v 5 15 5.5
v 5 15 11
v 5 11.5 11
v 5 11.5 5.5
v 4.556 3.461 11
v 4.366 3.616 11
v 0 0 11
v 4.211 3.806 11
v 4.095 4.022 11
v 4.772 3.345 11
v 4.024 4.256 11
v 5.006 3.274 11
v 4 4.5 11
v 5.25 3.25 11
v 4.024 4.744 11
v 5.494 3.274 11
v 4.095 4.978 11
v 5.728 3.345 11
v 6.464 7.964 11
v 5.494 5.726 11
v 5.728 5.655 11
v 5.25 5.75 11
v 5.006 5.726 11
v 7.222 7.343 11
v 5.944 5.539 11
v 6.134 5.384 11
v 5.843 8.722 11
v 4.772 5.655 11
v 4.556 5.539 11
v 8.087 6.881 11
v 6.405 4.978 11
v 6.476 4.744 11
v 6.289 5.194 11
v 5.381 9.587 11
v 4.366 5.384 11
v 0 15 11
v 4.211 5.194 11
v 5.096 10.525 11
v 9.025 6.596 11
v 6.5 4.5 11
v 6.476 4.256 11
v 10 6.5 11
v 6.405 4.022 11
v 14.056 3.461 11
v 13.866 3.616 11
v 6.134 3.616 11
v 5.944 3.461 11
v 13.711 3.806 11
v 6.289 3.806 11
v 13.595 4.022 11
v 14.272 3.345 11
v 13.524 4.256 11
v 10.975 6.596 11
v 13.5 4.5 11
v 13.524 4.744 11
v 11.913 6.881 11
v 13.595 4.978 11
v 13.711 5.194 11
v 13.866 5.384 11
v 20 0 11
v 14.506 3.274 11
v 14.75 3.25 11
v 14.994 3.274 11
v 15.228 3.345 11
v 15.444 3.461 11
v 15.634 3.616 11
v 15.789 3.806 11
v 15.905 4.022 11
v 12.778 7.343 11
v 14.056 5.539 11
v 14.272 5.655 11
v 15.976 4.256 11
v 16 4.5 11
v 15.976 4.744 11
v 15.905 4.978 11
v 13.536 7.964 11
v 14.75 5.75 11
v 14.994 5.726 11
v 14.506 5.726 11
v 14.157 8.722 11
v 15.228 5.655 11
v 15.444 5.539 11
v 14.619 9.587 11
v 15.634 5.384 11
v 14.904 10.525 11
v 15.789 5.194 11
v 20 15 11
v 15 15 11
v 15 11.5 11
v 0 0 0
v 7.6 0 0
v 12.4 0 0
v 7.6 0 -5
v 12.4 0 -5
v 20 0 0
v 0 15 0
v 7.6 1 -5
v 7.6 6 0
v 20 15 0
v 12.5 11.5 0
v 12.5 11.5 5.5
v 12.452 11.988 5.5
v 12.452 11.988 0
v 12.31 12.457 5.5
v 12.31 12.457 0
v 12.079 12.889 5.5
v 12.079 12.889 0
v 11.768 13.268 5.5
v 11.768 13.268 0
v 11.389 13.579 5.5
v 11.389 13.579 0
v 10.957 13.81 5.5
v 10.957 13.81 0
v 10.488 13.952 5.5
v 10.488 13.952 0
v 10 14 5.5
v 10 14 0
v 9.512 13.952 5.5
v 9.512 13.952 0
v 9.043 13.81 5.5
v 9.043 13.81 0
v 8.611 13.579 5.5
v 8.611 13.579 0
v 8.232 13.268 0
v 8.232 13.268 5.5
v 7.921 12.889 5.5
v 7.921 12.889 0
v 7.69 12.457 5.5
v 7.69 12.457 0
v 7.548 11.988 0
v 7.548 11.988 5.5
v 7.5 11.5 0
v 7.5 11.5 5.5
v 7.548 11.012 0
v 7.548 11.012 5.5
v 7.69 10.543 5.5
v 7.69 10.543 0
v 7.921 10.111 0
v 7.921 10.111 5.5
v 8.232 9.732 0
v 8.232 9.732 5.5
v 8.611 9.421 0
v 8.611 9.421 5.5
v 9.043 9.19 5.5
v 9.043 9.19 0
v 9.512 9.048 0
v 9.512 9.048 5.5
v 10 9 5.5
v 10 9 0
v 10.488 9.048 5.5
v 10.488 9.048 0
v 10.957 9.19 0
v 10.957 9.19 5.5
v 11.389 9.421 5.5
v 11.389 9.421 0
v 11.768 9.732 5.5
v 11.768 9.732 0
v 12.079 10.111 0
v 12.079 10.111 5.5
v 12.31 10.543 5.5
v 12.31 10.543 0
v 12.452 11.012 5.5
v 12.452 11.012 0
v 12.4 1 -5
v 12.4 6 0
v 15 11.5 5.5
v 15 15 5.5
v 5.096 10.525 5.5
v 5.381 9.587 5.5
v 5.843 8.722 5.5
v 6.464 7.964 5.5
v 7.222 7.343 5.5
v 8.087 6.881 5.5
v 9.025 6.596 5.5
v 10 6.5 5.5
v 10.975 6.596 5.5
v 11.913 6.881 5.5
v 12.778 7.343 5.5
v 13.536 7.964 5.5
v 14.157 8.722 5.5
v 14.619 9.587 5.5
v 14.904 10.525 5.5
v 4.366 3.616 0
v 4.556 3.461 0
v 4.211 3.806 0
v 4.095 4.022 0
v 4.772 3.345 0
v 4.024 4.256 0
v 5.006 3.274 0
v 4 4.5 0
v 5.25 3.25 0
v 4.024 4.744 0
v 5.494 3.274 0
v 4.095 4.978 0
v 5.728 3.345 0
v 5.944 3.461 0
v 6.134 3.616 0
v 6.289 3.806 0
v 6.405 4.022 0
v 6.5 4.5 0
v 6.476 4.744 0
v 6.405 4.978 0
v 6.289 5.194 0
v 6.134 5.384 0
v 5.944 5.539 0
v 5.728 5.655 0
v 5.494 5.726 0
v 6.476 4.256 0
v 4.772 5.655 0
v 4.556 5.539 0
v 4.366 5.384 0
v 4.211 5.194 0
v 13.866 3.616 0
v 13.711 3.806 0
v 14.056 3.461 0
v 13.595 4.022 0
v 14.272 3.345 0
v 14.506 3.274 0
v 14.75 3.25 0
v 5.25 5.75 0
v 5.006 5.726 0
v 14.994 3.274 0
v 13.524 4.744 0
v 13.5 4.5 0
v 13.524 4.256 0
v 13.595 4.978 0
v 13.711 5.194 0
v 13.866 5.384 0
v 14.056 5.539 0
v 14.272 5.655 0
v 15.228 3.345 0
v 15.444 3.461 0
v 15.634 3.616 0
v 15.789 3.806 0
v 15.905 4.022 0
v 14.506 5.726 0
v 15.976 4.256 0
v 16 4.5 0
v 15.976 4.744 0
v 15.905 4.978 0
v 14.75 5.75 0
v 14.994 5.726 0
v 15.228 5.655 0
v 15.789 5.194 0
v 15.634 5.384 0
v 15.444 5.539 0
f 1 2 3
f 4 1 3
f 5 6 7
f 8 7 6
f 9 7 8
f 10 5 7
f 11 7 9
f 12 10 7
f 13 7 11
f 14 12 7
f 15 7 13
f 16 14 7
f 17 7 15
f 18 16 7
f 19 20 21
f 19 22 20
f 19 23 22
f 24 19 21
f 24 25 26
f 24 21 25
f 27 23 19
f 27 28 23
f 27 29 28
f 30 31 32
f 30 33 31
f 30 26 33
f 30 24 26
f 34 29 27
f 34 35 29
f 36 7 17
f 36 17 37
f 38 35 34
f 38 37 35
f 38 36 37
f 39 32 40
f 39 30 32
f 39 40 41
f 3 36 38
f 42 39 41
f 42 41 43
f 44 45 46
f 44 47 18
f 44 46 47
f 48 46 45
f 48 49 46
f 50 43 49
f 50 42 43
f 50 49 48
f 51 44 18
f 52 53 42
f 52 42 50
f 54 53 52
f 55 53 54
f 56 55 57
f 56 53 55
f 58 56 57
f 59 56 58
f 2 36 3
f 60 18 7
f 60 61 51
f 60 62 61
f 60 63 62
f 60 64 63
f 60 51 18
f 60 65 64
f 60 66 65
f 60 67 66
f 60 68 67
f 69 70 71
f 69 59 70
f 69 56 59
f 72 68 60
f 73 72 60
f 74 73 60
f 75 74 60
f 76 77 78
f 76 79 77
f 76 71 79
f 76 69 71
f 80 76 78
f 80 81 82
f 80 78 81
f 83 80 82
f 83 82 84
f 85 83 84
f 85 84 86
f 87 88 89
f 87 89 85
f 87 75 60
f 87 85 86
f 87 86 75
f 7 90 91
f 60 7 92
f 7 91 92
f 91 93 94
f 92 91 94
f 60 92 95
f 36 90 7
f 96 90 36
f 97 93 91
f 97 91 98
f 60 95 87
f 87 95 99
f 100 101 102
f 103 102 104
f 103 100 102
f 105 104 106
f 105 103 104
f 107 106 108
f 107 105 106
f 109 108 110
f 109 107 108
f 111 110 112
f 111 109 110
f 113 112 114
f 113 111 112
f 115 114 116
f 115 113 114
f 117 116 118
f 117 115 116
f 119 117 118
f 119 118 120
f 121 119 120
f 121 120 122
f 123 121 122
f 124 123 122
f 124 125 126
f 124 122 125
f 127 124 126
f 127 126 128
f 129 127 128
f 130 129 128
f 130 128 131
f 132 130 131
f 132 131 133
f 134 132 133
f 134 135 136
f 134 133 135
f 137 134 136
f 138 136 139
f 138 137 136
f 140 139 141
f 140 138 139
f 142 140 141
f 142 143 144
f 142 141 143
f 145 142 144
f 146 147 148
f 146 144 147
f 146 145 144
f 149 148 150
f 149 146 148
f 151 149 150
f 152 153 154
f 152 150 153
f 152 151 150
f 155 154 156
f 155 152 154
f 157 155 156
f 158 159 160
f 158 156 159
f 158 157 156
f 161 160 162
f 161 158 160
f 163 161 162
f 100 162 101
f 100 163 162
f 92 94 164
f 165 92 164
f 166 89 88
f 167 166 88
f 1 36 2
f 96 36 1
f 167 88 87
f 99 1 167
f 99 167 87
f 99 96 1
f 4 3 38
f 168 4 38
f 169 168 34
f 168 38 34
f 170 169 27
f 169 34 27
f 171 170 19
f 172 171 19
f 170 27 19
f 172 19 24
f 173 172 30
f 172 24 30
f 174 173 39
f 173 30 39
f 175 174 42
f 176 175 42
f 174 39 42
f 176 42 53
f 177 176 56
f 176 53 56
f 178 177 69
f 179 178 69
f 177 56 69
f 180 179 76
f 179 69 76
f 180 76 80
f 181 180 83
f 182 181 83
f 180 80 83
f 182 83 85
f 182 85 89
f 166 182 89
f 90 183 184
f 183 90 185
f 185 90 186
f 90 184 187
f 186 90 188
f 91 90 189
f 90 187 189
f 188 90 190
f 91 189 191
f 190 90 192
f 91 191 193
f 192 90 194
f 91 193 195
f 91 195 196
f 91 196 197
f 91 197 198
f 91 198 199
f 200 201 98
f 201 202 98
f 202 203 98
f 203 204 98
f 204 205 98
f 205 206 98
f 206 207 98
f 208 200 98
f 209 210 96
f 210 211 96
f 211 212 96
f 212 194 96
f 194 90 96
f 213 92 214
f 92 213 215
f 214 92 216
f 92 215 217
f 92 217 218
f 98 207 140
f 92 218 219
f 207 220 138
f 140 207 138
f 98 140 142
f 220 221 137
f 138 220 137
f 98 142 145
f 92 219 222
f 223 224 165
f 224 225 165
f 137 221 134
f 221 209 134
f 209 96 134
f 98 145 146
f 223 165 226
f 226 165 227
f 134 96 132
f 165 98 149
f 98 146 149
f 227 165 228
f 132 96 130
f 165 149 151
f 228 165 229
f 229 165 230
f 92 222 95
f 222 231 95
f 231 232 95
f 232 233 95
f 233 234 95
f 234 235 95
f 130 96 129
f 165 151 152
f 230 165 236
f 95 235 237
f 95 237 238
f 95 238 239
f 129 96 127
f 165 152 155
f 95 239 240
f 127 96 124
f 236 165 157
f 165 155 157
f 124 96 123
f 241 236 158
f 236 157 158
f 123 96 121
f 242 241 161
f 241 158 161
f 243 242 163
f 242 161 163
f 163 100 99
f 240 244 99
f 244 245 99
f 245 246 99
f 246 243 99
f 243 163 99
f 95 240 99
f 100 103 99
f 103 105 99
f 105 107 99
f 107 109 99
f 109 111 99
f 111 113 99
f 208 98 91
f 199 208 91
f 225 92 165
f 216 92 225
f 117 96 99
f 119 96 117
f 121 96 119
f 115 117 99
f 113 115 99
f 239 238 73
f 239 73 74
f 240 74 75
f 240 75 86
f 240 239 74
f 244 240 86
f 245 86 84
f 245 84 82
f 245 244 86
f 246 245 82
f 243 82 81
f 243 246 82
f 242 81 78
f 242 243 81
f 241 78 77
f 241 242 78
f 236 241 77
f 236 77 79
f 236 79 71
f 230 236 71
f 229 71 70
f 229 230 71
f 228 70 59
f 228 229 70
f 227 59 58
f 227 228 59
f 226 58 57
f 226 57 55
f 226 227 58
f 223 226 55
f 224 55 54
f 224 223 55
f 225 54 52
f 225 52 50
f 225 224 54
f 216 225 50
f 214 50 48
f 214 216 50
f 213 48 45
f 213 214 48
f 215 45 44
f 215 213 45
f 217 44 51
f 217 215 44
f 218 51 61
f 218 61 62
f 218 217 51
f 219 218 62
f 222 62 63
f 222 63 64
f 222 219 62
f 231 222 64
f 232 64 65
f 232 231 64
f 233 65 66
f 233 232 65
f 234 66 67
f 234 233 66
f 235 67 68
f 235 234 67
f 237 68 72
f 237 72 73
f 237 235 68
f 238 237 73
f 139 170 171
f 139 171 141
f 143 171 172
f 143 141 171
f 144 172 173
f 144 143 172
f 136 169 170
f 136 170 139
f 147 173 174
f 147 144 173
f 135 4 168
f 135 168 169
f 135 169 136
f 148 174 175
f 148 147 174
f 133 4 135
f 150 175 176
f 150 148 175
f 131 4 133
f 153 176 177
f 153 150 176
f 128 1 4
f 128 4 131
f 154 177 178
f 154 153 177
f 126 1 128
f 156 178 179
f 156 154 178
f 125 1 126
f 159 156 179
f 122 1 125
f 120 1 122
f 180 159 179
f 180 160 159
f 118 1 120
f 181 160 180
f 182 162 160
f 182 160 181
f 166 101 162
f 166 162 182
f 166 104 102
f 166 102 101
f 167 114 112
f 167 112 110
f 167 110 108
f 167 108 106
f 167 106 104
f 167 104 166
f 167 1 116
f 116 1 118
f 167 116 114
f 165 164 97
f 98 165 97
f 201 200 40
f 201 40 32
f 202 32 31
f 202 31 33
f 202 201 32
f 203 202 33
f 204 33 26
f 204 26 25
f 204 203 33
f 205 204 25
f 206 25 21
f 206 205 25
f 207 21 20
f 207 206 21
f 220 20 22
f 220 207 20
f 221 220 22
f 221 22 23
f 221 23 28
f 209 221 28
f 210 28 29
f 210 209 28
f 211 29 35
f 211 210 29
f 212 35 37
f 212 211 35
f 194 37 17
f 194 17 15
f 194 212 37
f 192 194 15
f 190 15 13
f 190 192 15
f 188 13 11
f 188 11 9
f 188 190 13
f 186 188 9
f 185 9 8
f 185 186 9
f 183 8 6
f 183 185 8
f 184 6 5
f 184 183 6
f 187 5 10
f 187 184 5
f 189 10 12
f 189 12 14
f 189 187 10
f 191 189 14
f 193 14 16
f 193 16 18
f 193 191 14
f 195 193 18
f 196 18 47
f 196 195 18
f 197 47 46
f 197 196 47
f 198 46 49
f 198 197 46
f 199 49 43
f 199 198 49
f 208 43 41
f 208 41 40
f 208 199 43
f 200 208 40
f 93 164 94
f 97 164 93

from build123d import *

# Parameters (mm, degrees)
SKETCH1_W           = 20
SKETCH1_H           = 15
SKETCH1_R           = 2.5
SKETCH1_R_2         = 1.25
BOSS_EXTRUDE1_DEPTH = 11
CUT_EXTRUDE1_DEPTH  = 5.5
SKETCH3_W           = 4.8
SKETCH3_H           = 6
BOSS_EXTRUDE2_DEPTH = 5
CHAMFER1_SIZE       = 5


with BuildPart() as part:
    # Sketch1 → Boss-Extrude1 (new body)
    with BuildSketch(Plane.XY):
        with Locations((10, 7.5)):
            Rectangle(SKETCH1_W, SKETCH1_H)
        with Locations((10, 11.5)):
            Circle(SKETCH1_R, mode=Mode.SUBTRACT)
        with Locations((5.25, 4.5)):
            Circle(SKETCH1_R_2, mode=Mode.SUBTRACT)
        with Locations((14.75, 4.5)):
            Circle(SKETCH1_R_2, mode=Mode.SUBTRACT)
    extrude(amount=BOSS_EXTRUDE1_DEPTH)

    # Sketch2 → Cut-Extrude1 (cut)
    with BuildSketch(Plane.XY.offset(11)):
        with BuildLine():
            Line((15, 11.5), (15, 15))
            Line((15, 15), (5, 15))
            Line((5, 15), (5, 11.5))
            ThreePointArc((5, 11.5), (10, 6.5), (15, 11.5))
        make_face()
    extrude(amount=-CUT_EXTRUDE1_DEPTH, mode=Mode.SUBTRACT)

    # Sketch3 → Boss-Extrude2 (add)
    with BuildSketch(Plane(origin=(0, 0, 0), x_dir=(-1, 0, 0), z_dir=(0, 0, -1))):
        with Locations((-10, 3)):
            Rectangle(SKETCH3_W, SKETCH3_H)
    extrude(amount=BOSS_EXTRUDE2_DEPTH)

    # Chamfer1
    chamfer1_edges = [part.edges().sort_by_distance(p)[0] for p in [
        (10, 6, -5),
    ]]
    chamfer(chamfer1_edges, length=CHAMFER1_SIZE - 0.0001)  # a hair under: the kernel refuses the full size


solid = part.part
